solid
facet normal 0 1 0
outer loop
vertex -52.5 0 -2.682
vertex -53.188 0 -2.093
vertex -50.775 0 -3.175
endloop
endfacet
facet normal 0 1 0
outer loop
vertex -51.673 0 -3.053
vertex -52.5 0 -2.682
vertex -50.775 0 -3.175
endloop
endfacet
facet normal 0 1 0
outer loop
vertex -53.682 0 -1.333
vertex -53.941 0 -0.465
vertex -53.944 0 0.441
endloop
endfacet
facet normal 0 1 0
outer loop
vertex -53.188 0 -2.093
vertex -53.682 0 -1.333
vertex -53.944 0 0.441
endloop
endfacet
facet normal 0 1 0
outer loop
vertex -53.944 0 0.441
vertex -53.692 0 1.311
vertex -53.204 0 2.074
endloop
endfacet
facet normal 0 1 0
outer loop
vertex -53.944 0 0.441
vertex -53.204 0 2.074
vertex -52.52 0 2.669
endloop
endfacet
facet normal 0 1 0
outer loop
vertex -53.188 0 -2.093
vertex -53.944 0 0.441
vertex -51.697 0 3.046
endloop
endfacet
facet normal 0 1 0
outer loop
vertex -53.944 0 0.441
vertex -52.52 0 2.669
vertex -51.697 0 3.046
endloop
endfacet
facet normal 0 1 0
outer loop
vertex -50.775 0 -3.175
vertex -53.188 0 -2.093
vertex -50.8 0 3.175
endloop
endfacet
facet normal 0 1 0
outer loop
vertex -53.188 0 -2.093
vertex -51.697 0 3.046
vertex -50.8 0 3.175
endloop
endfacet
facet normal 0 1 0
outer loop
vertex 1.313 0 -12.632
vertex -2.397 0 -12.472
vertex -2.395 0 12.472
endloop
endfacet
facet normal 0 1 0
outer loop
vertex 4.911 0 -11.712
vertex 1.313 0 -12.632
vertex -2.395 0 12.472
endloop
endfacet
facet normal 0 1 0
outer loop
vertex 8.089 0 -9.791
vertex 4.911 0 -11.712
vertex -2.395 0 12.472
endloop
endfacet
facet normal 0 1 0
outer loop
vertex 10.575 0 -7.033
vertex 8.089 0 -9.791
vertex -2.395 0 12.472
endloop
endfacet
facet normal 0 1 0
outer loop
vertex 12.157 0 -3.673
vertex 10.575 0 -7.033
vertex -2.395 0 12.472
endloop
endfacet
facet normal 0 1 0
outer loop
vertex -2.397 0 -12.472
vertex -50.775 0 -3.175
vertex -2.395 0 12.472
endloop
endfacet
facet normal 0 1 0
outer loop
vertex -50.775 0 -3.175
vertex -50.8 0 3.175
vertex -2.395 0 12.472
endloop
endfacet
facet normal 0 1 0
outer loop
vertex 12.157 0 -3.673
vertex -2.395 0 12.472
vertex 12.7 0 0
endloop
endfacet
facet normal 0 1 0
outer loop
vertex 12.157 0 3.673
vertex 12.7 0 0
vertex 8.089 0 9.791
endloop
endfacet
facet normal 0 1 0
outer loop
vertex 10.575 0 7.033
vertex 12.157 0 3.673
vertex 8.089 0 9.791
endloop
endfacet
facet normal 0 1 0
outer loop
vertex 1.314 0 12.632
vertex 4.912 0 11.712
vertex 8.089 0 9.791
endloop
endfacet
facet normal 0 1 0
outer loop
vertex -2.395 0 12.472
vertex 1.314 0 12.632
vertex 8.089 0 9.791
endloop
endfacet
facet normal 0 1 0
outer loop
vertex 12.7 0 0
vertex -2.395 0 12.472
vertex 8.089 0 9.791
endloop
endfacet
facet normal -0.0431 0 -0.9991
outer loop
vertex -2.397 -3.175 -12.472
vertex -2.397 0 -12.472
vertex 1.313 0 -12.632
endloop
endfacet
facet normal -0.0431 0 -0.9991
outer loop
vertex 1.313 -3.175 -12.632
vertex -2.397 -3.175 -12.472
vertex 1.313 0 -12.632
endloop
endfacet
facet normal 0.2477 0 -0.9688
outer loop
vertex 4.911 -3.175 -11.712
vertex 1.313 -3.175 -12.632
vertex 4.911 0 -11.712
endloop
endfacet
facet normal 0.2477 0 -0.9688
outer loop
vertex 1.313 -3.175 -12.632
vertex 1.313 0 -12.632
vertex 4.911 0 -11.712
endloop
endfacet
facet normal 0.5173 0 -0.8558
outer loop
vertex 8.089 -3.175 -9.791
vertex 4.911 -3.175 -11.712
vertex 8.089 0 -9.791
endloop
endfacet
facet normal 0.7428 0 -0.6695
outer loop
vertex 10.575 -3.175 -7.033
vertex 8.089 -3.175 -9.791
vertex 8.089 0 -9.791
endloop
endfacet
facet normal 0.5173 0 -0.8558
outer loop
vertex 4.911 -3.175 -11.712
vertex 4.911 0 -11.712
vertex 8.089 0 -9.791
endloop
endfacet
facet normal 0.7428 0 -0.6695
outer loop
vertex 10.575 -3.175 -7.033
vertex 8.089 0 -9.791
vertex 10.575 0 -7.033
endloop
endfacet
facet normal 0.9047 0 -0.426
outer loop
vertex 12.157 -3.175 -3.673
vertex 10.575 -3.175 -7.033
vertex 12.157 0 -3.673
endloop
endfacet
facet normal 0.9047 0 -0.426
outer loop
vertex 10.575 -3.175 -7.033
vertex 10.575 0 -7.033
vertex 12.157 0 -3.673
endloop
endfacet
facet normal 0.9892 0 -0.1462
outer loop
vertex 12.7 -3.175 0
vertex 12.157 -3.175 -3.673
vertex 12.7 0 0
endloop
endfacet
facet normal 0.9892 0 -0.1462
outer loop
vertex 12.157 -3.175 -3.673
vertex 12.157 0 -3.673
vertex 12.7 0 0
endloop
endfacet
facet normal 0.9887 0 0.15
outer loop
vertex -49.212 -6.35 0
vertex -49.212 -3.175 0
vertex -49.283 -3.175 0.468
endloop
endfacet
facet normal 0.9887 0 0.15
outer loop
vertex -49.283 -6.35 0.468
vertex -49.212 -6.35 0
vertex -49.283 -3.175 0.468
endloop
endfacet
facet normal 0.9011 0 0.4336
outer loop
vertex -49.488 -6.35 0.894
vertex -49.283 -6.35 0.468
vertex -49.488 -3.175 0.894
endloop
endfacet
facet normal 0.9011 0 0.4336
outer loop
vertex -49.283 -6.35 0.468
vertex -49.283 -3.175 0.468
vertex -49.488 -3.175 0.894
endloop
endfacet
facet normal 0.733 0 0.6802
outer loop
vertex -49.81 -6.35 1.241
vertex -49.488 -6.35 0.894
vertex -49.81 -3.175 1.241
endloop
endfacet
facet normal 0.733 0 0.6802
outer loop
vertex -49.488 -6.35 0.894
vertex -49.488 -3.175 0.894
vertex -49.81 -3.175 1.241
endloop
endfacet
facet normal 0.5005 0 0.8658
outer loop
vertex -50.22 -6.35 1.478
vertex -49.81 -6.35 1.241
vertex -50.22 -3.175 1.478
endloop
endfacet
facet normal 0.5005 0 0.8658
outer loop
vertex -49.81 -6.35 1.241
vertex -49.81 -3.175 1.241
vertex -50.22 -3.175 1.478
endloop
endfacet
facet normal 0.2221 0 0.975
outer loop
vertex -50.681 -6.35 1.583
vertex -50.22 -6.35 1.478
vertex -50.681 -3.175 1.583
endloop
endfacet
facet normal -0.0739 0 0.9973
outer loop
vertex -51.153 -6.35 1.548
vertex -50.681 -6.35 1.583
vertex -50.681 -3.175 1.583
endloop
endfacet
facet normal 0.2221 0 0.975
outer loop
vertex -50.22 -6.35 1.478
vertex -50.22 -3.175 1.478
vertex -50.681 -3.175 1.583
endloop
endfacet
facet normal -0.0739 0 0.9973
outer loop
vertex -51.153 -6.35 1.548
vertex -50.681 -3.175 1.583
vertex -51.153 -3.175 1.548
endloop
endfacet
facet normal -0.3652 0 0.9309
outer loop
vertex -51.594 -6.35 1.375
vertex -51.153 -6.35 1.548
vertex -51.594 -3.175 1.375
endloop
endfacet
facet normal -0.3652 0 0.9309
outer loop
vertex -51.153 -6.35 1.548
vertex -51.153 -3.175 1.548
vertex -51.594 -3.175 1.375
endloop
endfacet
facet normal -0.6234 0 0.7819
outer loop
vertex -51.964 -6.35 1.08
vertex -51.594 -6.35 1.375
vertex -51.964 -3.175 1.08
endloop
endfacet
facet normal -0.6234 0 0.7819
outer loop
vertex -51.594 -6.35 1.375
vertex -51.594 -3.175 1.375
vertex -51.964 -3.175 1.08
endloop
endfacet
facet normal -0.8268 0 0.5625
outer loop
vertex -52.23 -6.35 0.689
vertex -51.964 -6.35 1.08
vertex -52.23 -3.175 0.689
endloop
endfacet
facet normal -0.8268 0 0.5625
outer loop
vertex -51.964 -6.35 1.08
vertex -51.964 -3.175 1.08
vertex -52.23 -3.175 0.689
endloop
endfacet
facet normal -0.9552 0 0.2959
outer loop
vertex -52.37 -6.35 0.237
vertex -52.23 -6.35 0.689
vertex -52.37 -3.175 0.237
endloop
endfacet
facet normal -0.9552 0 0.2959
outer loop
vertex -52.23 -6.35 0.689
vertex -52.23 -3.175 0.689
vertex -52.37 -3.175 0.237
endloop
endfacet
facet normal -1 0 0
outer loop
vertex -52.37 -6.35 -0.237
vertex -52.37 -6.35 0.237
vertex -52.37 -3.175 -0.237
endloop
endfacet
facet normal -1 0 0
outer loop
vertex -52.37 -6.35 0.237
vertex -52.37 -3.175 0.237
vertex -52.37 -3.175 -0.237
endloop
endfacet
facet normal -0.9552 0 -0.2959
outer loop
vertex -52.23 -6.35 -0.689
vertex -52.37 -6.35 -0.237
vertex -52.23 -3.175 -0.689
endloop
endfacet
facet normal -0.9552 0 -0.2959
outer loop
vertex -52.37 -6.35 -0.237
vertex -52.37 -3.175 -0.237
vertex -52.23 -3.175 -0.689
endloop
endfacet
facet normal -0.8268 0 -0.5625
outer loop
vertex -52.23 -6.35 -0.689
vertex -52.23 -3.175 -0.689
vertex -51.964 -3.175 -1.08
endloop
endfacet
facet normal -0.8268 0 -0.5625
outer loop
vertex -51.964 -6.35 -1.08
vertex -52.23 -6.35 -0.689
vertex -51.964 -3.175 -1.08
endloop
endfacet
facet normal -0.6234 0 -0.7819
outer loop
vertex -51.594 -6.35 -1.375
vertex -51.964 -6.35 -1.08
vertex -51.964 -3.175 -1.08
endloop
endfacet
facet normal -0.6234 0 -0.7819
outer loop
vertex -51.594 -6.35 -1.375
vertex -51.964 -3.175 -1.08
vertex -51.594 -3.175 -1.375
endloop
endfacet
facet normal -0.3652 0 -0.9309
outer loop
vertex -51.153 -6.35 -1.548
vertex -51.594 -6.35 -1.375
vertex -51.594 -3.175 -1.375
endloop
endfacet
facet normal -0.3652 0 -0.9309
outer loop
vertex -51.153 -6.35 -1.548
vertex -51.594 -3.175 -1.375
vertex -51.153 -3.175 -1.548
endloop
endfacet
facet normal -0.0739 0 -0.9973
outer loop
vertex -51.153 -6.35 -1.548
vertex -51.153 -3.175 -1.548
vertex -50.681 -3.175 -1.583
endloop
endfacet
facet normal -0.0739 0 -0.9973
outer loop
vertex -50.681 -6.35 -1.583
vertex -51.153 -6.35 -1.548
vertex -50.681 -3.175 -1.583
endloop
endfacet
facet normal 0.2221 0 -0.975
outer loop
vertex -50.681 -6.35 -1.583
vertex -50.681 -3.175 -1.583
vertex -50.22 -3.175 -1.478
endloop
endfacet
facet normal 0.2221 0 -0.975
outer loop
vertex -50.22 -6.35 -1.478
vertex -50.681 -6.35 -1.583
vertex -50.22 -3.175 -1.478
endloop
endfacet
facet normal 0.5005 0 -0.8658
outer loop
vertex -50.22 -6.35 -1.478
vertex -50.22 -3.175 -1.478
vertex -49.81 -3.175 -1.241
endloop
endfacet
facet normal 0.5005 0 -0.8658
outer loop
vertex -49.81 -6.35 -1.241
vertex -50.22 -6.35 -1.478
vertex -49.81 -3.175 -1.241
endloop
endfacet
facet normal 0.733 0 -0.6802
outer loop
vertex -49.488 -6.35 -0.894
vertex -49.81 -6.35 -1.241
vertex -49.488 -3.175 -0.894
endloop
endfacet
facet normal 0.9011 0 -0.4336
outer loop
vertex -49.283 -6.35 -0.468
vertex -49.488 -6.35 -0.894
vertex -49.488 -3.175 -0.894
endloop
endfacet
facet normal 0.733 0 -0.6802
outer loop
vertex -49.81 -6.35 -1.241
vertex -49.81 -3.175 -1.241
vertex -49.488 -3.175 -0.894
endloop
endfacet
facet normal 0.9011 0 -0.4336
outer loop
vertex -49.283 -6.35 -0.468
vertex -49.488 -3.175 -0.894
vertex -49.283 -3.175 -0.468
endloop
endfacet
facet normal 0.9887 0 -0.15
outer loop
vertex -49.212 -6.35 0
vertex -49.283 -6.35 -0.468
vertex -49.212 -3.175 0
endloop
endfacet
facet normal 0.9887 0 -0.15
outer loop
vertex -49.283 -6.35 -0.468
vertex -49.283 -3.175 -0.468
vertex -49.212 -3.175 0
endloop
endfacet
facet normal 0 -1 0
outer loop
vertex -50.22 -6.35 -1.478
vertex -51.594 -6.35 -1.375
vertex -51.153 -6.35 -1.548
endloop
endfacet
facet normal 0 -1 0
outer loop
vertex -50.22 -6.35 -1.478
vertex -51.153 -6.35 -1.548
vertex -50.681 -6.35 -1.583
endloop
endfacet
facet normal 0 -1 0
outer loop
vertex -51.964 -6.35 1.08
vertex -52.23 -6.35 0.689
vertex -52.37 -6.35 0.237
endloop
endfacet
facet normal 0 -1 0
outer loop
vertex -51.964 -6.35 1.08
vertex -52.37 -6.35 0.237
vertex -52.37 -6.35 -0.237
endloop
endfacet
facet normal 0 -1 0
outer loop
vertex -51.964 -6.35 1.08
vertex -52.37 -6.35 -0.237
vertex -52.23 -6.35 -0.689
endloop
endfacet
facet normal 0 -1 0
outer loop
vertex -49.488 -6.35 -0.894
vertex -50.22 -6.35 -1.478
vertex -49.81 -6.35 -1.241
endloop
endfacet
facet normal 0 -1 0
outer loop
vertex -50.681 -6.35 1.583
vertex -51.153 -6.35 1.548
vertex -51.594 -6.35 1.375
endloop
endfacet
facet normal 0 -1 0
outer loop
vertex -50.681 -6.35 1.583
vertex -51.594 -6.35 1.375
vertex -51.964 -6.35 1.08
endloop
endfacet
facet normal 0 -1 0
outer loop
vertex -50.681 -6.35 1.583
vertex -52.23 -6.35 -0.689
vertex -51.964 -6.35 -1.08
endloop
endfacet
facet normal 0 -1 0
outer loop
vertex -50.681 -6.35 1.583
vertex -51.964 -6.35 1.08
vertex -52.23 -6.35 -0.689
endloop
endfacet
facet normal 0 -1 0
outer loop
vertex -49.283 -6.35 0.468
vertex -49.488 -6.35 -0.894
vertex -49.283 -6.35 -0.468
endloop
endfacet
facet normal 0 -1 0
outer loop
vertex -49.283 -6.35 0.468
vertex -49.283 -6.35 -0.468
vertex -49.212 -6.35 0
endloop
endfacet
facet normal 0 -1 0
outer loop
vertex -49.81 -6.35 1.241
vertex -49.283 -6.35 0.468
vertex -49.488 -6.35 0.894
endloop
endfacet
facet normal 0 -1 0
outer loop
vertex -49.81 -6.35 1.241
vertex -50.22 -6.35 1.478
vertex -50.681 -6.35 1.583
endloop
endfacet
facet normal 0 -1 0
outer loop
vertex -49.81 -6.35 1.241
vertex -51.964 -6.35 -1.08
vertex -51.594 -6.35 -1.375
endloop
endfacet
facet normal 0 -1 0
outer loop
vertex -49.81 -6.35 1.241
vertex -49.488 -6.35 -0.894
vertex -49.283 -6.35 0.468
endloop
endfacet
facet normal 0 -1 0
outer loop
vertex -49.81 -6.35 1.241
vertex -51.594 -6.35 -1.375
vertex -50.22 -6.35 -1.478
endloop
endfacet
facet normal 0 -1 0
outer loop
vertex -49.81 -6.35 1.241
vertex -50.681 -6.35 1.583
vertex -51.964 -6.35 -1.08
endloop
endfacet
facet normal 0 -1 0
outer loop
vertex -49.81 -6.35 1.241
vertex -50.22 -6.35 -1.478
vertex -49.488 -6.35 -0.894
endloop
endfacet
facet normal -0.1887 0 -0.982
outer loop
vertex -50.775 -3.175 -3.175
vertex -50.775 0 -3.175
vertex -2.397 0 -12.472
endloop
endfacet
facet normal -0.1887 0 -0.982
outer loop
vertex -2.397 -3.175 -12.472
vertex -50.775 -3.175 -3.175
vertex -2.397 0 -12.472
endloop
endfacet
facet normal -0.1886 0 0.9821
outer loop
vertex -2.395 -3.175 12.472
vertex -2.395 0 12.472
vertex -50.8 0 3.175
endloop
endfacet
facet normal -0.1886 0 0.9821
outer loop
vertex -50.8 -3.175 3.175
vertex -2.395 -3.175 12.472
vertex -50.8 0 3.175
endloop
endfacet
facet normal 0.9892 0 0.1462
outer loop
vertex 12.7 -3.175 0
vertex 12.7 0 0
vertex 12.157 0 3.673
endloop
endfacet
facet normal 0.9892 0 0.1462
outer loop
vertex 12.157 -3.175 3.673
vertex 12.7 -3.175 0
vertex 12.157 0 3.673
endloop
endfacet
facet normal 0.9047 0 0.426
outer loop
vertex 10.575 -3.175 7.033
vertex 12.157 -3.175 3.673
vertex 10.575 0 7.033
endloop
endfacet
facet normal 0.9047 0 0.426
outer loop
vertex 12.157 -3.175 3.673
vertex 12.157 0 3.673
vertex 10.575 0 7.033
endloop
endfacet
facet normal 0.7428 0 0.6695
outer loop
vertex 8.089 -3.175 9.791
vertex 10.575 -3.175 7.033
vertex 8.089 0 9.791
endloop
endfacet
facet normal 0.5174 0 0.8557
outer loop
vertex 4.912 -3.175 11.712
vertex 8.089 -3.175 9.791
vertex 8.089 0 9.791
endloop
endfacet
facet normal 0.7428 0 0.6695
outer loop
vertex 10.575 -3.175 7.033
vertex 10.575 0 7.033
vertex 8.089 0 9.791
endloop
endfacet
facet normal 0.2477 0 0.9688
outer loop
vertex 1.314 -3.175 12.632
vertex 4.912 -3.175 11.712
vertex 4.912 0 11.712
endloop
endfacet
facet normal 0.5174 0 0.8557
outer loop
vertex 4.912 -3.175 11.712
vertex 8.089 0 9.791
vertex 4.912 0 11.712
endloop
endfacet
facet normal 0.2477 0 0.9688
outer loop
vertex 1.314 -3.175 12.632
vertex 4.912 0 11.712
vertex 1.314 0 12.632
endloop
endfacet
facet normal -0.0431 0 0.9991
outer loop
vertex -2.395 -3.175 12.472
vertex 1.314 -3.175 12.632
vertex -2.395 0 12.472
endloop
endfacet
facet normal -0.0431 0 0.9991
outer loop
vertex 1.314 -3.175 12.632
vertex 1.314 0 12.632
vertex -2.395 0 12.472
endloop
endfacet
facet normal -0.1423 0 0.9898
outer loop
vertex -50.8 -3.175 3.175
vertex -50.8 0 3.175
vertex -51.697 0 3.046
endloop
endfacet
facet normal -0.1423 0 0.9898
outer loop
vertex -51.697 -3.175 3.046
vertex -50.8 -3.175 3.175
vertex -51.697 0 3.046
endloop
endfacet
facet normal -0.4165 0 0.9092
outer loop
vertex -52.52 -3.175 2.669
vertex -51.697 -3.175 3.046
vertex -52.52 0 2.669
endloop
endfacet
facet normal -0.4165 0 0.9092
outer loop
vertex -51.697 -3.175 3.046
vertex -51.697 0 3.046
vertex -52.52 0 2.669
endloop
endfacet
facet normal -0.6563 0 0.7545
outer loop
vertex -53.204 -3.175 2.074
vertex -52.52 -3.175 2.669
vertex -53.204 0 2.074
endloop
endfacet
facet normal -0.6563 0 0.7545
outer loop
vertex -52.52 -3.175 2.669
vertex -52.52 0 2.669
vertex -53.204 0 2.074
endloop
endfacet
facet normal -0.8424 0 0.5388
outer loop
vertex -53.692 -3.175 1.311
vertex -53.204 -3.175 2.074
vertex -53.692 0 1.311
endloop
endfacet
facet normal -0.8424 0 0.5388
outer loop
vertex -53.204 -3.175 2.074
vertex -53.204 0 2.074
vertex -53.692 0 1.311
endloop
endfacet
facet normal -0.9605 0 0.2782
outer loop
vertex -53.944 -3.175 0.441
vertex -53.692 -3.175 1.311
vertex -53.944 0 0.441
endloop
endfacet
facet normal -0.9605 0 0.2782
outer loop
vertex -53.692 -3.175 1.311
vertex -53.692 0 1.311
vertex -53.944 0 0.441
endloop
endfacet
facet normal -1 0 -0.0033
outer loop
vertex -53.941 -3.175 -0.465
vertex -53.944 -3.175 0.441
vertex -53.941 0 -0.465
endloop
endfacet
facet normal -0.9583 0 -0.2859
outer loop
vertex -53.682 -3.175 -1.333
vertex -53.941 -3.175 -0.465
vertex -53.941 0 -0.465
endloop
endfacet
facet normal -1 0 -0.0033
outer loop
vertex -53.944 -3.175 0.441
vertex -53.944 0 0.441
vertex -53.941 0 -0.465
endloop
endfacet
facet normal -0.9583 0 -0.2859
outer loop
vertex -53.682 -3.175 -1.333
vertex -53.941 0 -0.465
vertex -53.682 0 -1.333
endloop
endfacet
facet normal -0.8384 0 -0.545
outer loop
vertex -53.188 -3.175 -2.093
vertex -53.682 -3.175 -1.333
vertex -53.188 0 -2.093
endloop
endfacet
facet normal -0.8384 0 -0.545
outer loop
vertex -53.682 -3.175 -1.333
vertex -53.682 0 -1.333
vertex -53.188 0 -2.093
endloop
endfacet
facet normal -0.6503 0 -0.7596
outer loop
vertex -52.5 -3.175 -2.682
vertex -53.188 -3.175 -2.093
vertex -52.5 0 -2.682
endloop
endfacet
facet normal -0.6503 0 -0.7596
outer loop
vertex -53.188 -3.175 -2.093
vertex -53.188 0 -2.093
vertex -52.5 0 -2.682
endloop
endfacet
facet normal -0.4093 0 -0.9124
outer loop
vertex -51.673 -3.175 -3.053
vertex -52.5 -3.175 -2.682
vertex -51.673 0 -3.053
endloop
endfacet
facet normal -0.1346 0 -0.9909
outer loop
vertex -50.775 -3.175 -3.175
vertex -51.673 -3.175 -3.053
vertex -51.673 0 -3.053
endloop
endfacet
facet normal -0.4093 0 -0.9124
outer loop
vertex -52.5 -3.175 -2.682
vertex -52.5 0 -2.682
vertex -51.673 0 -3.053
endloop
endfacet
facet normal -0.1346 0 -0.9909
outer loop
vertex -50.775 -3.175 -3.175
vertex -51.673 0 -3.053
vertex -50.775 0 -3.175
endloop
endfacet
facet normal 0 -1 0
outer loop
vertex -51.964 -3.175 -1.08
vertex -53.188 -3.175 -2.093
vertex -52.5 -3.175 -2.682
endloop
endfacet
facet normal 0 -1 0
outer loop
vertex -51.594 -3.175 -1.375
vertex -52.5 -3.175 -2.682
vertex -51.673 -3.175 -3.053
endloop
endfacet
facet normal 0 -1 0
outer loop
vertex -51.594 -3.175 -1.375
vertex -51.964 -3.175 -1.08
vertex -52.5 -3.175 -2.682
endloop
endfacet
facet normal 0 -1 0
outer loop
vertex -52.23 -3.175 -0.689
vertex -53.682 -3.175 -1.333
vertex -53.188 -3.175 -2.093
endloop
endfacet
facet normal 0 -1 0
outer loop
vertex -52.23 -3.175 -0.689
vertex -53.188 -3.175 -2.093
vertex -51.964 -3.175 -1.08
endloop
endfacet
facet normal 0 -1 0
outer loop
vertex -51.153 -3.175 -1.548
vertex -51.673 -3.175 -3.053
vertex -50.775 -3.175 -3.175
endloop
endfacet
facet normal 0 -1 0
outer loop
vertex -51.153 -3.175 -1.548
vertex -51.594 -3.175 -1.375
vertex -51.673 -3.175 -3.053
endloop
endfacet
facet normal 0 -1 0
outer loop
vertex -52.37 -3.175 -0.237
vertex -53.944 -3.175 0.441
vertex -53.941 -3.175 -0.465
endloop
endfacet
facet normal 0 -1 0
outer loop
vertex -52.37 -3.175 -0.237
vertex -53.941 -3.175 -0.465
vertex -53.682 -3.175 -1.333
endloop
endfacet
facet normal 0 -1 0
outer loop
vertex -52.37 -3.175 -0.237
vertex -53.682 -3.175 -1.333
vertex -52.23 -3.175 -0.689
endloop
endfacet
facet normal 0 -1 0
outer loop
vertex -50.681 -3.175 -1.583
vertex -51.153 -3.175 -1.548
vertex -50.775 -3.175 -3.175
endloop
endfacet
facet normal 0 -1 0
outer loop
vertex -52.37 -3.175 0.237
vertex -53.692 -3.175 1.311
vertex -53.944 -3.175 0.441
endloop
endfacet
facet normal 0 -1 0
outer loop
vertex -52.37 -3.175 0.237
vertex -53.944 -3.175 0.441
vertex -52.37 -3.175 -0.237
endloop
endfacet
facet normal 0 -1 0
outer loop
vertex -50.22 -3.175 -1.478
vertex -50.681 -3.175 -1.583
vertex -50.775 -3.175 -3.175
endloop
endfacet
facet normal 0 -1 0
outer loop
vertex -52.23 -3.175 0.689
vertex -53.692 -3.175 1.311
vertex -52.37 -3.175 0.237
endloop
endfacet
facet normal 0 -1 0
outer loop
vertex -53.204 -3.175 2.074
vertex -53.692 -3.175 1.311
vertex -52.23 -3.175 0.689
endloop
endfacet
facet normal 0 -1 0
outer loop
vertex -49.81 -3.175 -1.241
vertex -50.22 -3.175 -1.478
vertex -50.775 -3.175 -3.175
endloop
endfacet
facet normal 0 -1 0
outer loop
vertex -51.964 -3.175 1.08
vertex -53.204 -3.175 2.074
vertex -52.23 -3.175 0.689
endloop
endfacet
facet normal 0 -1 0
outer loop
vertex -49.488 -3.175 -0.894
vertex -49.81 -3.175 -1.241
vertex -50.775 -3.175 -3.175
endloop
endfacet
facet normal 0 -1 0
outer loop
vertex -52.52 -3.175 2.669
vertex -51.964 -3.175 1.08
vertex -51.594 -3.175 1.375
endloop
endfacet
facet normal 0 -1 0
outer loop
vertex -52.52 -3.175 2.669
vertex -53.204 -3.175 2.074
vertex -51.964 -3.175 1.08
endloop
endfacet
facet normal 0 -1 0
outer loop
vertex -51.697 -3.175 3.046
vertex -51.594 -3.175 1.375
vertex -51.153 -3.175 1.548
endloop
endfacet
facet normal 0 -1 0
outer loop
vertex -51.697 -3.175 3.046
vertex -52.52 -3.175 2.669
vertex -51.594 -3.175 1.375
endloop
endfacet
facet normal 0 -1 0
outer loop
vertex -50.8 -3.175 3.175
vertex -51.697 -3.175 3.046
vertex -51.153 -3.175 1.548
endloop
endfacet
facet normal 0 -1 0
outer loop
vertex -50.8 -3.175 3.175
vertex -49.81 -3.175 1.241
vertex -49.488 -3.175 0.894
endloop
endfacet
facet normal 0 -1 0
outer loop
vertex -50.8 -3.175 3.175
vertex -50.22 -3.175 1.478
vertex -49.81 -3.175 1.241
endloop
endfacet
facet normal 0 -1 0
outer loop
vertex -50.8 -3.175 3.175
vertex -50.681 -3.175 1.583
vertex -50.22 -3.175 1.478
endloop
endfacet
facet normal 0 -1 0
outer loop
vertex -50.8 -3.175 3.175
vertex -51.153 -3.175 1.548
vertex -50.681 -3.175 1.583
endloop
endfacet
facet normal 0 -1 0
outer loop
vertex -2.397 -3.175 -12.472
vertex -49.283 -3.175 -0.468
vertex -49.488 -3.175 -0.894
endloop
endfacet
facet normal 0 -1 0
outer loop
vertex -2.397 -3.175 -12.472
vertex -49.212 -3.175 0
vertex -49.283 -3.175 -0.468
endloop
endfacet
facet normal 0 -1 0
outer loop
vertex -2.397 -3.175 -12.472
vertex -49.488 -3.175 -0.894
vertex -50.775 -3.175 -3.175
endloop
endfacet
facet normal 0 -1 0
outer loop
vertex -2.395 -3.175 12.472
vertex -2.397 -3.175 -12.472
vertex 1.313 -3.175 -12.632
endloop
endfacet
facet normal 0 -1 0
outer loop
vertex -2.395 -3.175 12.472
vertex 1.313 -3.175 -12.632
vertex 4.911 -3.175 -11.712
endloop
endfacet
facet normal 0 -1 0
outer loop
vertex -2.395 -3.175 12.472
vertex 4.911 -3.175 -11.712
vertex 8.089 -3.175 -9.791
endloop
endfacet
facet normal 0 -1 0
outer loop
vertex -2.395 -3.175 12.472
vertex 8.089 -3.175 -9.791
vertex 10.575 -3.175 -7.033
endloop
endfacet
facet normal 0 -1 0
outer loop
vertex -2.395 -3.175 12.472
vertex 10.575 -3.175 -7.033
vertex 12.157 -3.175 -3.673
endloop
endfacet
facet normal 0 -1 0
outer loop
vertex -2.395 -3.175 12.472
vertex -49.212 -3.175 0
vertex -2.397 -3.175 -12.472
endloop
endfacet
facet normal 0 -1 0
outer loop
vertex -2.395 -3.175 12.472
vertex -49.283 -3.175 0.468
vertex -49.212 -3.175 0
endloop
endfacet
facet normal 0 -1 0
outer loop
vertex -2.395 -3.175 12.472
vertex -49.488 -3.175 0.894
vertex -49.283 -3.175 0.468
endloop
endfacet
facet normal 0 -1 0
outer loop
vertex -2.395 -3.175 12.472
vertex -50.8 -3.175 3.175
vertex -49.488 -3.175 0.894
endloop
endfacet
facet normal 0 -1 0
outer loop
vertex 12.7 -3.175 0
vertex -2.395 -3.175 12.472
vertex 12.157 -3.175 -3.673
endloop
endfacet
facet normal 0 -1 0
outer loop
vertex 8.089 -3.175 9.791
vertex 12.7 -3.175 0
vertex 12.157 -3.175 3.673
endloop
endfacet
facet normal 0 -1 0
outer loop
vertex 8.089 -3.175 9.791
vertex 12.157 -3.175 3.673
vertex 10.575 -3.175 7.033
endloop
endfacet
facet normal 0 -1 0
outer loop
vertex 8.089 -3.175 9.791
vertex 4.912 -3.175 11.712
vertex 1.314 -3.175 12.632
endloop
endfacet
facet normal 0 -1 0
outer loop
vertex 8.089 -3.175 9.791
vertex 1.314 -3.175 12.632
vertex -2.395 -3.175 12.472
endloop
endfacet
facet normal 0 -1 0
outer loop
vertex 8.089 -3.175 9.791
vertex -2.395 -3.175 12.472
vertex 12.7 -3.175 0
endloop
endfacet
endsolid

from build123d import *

# Parameters (mm, degrees)
F1_DEPTH = 3.175
F2_R     = 1.5875
F3_DEPTH = 3.175


with BuildPart() as f1:
    # F0 (on Front) → F1 (new body)
    with BuildSketch(Plane.XZ):
        with BuildLine():
            ThreePointArc((-2.396699, -12.471802), (8.088632, -9.791018), (12.7, 0))
            ThreePointArc((12.7, 0), (8.089103, 9.790629), (-2.395498, 12.472032))
            ThreePointArc((-2.395498, 12.472032), (-12.7, 0.000611), (-2.396699, -12.471802))
        make_face()
        with BuildLine():
            ThreePointArc((-2.396699, -12.471802), (-12.7, 0.000611), (-2.395498, 12.472032))
            Line((-2.395498, 12.472032), (-50.8, 3.175))
            ThreePointArc((-50.8, 3.175), (-48.554936, 2.245064), (-47.625, 0))
            ThreePointArc((-47.625, 0), (-48.546238, -2.236332), (-50.775351, -3.174904))
            Line((-50.775351, -3.174904), (-2.396699, -12.471802))
        make_face()
        with BuildLine():
            ThreePointArc((-47.625, 0), (-48.554936, 2.245064), (-50.8, 3.175))
            ThreePointArc((-50.8, 3.175), (-53.974976, -0.012325), (-50.775351, -3.174904))
            ThreePointArc((-50.775351, -3.174904), (-48.546238, -2.236332), (-47.625, 0))
        make_face()
    extrude(amount=F1_DEPTH)

    # F2 (on face) → F3 (join)
    with BuildSketch(Plane.XZ.offset(3.175)):
        with Locations((-50.8, 0)):
            Circle(F2_R)
    extrude(amount=F3_DEPTH)


solid = f1.part
